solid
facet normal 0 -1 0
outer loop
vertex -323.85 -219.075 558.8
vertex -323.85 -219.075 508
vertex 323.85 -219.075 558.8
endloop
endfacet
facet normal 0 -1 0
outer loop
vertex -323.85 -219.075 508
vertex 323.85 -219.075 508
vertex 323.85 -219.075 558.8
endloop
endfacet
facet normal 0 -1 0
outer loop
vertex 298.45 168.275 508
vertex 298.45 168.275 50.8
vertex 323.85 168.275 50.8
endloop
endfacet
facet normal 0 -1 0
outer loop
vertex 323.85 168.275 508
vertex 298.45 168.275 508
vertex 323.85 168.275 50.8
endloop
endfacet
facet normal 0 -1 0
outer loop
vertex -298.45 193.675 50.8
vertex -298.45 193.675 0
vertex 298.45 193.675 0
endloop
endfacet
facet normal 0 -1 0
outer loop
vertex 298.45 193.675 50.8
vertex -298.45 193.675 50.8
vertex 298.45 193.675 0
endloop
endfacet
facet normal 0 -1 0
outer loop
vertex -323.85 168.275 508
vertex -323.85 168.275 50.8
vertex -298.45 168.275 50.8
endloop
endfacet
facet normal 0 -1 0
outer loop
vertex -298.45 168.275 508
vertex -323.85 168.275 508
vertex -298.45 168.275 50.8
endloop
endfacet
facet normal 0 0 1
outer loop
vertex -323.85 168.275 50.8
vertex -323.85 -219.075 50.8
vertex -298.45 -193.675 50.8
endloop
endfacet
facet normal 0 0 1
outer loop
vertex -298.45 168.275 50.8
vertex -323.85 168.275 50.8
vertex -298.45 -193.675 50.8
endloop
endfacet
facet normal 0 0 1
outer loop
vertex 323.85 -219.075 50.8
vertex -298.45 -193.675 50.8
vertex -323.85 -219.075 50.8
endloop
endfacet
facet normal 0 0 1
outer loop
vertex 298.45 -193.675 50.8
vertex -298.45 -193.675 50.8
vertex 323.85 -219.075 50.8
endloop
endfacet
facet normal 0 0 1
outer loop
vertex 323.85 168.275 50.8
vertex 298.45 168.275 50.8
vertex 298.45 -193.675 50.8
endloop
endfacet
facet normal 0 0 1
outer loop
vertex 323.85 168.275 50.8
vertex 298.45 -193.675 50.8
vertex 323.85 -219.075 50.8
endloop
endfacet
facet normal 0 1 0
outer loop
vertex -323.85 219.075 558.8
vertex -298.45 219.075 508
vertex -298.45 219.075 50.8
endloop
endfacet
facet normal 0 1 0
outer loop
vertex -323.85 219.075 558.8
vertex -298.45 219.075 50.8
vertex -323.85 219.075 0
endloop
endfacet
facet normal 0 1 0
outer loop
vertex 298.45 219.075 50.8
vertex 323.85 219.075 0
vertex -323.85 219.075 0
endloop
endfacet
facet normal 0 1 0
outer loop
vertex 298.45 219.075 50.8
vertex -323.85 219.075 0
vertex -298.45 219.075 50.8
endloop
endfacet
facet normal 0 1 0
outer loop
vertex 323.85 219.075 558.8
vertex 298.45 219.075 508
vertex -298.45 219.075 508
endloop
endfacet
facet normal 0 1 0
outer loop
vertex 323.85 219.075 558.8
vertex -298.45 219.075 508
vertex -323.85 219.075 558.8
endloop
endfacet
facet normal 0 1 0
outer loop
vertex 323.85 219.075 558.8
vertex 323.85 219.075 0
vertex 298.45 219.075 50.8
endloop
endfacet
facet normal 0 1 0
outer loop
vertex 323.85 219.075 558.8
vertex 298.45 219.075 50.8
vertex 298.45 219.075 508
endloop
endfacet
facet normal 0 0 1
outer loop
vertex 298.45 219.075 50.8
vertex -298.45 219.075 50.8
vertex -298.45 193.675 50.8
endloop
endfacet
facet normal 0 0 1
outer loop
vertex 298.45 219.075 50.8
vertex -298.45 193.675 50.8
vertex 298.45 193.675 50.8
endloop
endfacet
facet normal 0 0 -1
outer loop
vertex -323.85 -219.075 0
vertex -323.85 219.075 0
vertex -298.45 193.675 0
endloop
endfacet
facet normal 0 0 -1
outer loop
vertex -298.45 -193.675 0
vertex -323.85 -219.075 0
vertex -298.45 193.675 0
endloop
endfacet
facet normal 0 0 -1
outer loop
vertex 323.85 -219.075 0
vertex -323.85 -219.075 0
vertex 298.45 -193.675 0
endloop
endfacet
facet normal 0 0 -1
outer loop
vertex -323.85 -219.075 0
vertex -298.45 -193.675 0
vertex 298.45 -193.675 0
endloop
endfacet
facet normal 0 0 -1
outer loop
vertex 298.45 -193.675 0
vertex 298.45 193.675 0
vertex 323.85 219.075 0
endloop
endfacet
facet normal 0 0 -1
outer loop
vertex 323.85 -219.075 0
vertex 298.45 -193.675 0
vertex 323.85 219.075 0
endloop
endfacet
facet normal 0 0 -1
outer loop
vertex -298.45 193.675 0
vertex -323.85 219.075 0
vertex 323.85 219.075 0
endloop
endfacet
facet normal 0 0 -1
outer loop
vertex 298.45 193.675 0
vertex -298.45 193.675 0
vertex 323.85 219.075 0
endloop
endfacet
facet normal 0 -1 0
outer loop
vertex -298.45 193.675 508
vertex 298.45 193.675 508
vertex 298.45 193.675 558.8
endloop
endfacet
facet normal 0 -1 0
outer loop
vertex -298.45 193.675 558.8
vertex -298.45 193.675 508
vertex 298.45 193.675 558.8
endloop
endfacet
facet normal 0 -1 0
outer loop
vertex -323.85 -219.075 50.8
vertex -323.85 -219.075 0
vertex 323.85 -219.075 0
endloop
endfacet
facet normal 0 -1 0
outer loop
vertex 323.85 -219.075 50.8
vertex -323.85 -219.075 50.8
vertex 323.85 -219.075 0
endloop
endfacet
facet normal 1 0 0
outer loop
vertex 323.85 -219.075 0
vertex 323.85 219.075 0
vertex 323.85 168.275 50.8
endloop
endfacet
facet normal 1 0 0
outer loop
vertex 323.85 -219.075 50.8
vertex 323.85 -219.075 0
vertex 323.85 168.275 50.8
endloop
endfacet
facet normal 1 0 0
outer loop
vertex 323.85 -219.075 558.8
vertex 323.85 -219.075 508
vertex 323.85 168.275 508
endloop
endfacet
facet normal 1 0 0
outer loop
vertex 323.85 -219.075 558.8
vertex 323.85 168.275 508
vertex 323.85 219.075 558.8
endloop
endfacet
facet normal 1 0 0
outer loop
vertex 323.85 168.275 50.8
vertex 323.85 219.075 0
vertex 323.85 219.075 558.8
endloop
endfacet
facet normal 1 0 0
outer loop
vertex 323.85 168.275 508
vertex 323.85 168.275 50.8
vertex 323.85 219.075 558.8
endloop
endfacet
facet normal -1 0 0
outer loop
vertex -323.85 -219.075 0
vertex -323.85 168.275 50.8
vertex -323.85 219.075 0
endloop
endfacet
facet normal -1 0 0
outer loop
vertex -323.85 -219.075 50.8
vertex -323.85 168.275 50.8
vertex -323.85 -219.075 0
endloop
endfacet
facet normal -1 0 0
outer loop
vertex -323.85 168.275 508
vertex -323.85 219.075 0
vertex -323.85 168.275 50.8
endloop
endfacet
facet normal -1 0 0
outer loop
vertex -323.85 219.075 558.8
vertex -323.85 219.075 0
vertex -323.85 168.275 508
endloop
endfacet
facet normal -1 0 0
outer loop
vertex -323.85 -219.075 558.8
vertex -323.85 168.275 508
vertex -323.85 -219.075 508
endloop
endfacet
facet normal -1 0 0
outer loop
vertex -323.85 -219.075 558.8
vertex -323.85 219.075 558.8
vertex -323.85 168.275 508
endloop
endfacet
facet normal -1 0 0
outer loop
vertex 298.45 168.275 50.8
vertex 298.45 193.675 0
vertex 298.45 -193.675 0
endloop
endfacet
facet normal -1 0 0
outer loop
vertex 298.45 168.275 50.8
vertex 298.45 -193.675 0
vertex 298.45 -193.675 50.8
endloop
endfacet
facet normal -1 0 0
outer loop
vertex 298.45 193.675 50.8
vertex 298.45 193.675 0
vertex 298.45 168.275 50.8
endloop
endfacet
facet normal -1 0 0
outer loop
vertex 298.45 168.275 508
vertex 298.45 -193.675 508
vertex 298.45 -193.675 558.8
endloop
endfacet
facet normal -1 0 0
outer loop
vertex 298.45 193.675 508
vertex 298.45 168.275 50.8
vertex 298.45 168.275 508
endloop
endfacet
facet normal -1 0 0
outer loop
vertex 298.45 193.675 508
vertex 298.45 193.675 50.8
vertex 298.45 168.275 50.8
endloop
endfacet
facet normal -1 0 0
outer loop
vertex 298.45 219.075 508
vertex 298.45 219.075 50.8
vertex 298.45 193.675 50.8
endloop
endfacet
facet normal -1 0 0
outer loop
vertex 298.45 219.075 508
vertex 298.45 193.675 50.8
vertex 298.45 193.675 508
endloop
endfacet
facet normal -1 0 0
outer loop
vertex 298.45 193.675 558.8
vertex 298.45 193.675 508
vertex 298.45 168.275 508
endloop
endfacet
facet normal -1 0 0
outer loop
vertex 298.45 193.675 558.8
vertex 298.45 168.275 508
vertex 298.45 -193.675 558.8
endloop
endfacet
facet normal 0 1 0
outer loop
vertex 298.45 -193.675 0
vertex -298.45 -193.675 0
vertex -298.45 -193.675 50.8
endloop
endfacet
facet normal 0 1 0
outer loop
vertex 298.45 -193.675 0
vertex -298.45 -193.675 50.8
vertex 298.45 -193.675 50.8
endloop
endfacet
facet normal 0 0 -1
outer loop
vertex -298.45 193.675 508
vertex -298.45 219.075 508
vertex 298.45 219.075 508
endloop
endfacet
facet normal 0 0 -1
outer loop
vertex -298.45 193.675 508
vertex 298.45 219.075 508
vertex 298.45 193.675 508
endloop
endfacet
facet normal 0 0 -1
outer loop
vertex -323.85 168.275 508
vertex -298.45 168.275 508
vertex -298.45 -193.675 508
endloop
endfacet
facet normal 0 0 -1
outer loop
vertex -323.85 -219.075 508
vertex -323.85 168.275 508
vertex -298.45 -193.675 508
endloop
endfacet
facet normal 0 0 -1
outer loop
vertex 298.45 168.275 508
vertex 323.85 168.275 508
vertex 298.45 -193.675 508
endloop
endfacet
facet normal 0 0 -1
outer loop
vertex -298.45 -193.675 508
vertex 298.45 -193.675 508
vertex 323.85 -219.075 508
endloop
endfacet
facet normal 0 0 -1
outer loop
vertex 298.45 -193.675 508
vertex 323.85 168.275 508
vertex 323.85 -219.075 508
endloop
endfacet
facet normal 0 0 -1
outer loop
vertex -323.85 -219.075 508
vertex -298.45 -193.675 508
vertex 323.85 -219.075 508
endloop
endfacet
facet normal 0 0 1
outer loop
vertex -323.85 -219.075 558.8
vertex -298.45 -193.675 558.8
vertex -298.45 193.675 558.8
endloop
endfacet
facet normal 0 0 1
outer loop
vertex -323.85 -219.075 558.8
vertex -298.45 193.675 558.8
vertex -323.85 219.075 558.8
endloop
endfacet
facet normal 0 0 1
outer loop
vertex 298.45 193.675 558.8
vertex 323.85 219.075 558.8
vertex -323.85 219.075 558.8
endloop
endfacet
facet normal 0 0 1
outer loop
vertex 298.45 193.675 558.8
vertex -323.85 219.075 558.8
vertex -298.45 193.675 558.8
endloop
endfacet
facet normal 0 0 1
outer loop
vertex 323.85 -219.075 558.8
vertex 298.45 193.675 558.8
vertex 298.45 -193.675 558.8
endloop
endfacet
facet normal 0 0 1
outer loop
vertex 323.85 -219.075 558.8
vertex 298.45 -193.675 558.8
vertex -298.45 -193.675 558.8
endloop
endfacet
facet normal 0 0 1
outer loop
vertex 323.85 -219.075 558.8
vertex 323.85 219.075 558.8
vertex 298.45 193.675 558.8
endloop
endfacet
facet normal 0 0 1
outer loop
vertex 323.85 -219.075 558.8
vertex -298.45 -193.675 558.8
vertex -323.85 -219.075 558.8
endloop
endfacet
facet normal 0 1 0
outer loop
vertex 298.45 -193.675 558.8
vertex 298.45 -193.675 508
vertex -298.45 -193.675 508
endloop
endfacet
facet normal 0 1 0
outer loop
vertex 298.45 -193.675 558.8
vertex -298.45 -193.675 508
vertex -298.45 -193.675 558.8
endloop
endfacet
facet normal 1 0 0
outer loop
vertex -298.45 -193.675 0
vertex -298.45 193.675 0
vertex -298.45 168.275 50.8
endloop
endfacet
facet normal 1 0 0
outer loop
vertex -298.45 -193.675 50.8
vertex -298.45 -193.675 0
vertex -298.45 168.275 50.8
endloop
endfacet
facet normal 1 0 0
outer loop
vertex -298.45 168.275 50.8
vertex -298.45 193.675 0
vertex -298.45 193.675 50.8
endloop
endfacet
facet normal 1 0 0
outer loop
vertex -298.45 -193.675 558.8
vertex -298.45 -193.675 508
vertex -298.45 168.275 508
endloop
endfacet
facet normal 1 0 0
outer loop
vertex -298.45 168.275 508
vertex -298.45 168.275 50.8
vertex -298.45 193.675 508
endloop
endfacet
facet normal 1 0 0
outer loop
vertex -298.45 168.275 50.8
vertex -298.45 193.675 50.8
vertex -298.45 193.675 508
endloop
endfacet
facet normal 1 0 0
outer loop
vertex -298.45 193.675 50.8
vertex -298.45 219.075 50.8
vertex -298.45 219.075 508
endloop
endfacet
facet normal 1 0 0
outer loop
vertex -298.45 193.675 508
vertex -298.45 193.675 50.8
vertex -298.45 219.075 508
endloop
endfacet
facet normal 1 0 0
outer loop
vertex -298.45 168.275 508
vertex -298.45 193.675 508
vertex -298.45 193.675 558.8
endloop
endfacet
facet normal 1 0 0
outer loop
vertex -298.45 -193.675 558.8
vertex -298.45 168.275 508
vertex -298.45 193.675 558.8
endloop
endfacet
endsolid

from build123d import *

# Parameters (mm, degrees)
F0_W      = 647.7
F0_H      = 438.15
F0_W_2    = 596.9
F0_H_2    = 387.35
F1_DEPTH  = 50.8
F3_DEPTH  = 508
F4_W      = 25.4
F4_H      = 50.8
F5_DEPTH  = 374.65
F6_W      = 25.4
F6_H      = 50.8
F7_DEPTH  = 387.35
F8_W      = 25.4
F8_H      = 50.8
F9_DEPTH  = 622.3
F10_W     = 25.4
F10_H     = 50.8
F11_DEPTH = 622.3


with BuildPart() as f1:
    # F0 (on Top) → F1 (new body)
    with BuildSketch(Plane.XY):
        Rectangle(F0_W, F0_H)
        Rectangle(F0_W_2, F0_H_2, mode=Mode.SUBTRACT)
    extrude(amount=F1_DEPTH)

    # F2 (on face) → F3 (join)
    with BuildSketch(Plane.XY.offset(50.8)):
        Polygon((-298.45, 219.075), (-323.85, 219.075), (-323.85, 168.275), (-298.45, 168.275), (-298.45, 193.675), align=None)
        Polygon((323.85, 219.075), (298.45, 219.075), (298.45, 193.675), (298.45, 168.275), (323.85, 168.275), align=None)
    extrude(amount=F3_DEPTH)

    # F4 (on face) → F5 (join)
    with BuildSketch(Plane.XZ.offset(-168.275)):
        with Locations((-311.15, 533.4)):
            Rectangle(F4_W, F4_H)
    extrude(amount=F5_DEPTH)

    # F6 (on face) → F7 (join)
    with BuildSketch(Plane.XZ.offset(-168.275)):
        with Locations((311.15, 533.4)):
            Rectangle(F6_W, F6_H)
    extrude(amount=F7_DEPTH)

    # F8 (on face) → F9 (join)
    with BuildSketch(Plane(origin=(298.45, 0, 0), x_dir=(0, -1, 0), z_dir=(-1, 0, 0))):
        with Locations((206.375, 533.4)):
            Rectangle(F8_W, F8_H)
    extrude(amount=F9_DEPTH)

    # F10 (on face) → F11 (join)
    with BuildSketch(Plane(origin=(298.45, 0, 0), x_dir=(0, -1, 0), z_dir=(-1, 0, 0))):
        with Locations((-206.375, 533.4)):
            Rectangle(F10_W, F10_H)
    extrude(amount=F11_DEPTH)


solid = f1.part
